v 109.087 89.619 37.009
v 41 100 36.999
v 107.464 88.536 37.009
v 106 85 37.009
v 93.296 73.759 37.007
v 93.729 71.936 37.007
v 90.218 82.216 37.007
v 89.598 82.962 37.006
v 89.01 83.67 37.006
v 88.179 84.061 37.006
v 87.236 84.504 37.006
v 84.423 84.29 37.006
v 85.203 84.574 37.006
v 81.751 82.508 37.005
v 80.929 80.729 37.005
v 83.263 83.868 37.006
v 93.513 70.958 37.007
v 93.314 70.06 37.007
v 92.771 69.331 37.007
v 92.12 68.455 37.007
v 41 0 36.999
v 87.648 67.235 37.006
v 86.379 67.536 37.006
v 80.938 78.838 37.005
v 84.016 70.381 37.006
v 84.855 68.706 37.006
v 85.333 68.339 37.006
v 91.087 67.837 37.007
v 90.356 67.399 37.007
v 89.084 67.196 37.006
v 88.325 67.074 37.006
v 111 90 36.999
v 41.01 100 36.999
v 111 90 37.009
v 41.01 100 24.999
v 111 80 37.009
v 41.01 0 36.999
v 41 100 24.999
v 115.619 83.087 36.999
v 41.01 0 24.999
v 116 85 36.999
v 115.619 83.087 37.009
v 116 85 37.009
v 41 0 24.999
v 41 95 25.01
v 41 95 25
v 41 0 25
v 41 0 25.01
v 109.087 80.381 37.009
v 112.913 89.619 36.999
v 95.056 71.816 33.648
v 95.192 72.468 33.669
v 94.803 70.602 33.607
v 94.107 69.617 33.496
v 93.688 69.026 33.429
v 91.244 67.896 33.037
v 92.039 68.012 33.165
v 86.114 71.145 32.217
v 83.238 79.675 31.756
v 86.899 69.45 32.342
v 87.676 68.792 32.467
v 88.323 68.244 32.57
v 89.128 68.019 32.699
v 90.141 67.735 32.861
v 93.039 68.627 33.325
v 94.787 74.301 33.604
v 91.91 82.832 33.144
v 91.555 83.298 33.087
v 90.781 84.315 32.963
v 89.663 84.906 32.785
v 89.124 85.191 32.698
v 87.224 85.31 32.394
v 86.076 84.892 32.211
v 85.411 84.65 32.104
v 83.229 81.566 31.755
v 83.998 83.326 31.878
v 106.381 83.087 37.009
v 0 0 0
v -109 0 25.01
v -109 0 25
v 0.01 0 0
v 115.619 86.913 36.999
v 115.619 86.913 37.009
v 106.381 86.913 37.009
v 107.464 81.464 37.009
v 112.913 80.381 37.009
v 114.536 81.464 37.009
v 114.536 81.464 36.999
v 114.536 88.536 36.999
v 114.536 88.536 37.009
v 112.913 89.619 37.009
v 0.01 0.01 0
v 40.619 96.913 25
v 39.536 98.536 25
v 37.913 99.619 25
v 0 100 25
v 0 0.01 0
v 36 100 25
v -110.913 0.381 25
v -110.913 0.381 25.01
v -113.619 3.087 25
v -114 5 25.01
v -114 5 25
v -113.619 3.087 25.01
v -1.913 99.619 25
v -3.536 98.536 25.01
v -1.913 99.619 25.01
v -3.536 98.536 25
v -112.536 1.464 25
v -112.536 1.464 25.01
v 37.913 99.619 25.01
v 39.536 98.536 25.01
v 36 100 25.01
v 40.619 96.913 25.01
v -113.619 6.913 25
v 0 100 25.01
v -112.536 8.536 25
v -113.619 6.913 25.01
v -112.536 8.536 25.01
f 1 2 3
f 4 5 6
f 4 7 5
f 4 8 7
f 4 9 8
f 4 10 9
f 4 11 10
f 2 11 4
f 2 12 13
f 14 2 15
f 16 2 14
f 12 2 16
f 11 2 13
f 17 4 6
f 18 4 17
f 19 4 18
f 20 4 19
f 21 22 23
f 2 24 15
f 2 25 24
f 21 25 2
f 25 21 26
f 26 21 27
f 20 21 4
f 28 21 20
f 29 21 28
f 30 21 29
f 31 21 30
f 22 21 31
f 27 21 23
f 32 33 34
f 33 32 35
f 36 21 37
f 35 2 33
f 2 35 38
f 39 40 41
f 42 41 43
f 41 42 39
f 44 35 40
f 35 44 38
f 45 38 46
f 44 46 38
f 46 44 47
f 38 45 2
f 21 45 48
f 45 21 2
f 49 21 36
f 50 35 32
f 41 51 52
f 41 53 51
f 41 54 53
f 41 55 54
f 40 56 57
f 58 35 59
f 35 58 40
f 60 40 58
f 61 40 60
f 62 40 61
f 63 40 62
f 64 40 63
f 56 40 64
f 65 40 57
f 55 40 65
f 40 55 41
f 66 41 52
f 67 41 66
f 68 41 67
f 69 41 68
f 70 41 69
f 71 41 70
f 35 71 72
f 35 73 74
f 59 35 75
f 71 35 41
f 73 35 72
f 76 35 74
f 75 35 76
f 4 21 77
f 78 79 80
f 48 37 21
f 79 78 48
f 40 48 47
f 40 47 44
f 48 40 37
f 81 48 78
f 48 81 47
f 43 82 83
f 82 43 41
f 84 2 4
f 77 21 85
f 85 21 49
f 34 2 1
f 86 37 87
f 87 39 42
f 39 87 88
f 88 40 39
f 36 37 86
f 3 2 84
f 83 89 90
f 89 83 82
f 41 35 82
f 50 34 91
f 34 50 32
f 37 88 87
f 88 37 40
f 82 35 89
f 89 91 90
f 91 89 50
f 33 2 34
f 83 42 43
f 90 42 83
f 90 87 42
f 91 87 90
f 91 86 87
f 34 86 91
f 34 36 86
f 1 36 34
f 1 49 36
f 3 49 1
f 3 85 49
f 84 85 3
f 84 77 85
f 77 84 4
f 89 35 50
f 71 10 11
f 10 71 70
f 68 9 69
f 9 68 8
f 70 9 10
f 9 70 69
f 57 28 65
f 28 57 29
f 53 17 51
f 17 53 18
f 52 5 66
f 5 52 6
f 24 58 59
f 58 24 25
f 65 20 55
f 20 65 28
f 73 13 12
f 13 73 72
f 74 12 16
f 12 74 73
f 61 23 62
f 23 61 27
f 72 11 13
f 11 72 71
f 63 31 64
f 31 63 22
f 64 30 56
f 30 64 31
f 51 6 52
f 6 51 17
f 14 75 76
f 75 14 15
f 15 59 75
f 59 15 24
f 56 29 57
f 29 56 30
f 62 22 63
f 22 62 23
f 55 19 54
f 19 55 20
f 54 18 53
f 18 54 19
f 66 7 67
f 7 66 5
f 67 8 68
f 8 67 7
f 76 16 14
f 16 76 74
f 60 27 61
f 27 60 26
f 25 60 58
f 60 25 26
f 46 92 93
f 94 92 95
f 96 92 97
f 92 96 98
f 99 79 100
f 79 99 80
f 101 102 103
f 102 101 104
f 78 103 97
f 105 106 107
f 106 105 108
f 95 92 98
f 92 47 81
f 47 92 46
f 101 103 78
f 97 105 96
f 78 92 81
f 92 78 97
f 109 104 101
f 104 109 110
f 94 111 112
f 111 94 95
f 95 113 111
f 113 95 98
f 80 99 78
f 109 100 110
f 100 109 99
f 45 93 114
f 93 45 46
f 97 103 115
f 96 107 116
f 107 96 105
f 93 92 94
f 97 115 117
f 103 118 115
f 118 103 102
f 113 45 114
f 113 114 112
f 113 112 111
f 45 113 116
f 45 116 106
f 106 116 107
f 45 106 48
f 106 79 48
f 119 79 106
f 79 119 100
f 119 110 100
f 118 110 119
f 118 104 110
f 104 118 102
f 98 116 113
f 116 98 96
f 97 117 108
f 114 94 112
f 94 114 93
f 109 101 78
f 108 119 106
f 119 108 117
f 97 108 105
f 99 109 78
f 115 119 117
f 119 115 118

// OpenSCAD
// file: front_plug_common.scad
receptacleOuterDia=80;
receptacleInnerDia=45;

receptacleMountingRingInsetDia=61;

receptacleBracketBaseWidth=130;
receptacleBracketBaseCornerRadius=3;

motorMountPlateWidth=155;

// This is how far the transition casing sticks back from the trailing edge of the motor mount.
transitionWidthAtV=100;

motorMountPlateVOffset=114;

motorMountPlateVOffsetShortSide=motorMountPlateWidth-motorMountPlateVOffset;
// main file
include <front_plug_common.scad>


cornerDia=10;

wireDia=9;
// This should be approximately trianglePatchWidth* 2/3
wireHoleXOffset=50;
wireHoleYOffset=82;
wireHoleRotationAngle=-70;
wireHoleReliefAngle=25;
wireHoleExtraCutLengthForReliefAngle=10;

overhangMaxDepth=25;


// x-offset from the inner edge of the boat side-rail to the corner above the rod-holders
trianglePatchWidth=75;

// y-offset from the base corner / trailing edge of motor mount.
trianglePatchApexYPosition=85;

// measured from the outer edge of the boat (approximately same as bottom of motormount V)
trianglePatchHighSideZOffset=22.5;
trianglePatchLowSideZOffset=10.5;


// calculated
trianglePatchLowToHighRise=trianglePatchHighSideZOffset-trianglePatchLowSideZOffset;

overlap=0.001;
surfaceThickness=0.01;

// Top view is from above the motor mount looking towards the back of the boat
// origin is at the back edge of the motor mount (x axis)
//       and at the "V" in the lower motor mount plate 
//       (which is also approximately the same position as the outer edge of the boat's side rail)

// NOTE: Some angles appear sharper because the top plate of the motor mount is
// angled up on the boat, but modeled level/flat.  Trust the measurements.

hull() {
    // top ridge adjacent to the trailing edge of the motor mount
    translate([-motorMountPlateVOffset+cornerDia/2,0,overhangMaxDepth]) 
        cube([motorMountPlateWidth-cornerDia/2, surfaceThickness, surfaceThickness]);
    translate([-motorMountPlateVOffset+cornerDia/2,cornerDia/2,overhangMaxDepth]) 
        cylinder(d=cornerDia, h=surfaceThickness);
    
    // bottom of V adjacent to the trailing edge of the motor mount
    cube([surfaceThickness,surfaceThickness,surfaceThickness]);
    
    // rear bend aligned with motor mount "V"
    translate([0,transitionWidthAtV-cornerDia/2,overhangMaxDepth])
        cylinder(d=cornerDia, h=surfaceThickness);
    
    // top plate at inner edge of boat side-rail (trailing end of bracket)
    translate([motorMountPlateVOffsetShortSide-cornerDia/2,transitionWidthAtV-cornerDia/2,overhangMaxDepth]) 
        cylinder(d=cornerDia, h=surfaceThickness);
}

translate([motorMountPlateVOffsetShortSide,0,overhangMaxDepth-overlap])
difference() {
    hull() {
       translate([trianglePatchWidth-cornerDia/2,trianglePatchApexYPosition,trianglePatchLowToHighRise]) 
           cylinder(d=cornerDia, h=surfaceThickness);
       translate([0,0,0])
           cube([surfaceThickness,transitionWidthAtV,trianglePatchLowToHighRise]);
    }
    // hole for wires
    translate([wireHoleXOffset,wireHoleYOffset,0])
    rotate([wireHoleReliefAngle,0,wireHoleRotationAngle])
    hull() {
        cylinder(d=wireDia, 
            h=trianglePatchLowToHighRise+surfaceThickness+overlap*2+wireHoleExtraCutLengthForReliefAngle);
        translate([wireDia,0,0])
            cylinder(d=wireDia, 
                h=trianglePatchLowToHighRise+surfaceThickness+overlap*2+wireHoleExtraCutLengthForReliefAngle);
    }
}
